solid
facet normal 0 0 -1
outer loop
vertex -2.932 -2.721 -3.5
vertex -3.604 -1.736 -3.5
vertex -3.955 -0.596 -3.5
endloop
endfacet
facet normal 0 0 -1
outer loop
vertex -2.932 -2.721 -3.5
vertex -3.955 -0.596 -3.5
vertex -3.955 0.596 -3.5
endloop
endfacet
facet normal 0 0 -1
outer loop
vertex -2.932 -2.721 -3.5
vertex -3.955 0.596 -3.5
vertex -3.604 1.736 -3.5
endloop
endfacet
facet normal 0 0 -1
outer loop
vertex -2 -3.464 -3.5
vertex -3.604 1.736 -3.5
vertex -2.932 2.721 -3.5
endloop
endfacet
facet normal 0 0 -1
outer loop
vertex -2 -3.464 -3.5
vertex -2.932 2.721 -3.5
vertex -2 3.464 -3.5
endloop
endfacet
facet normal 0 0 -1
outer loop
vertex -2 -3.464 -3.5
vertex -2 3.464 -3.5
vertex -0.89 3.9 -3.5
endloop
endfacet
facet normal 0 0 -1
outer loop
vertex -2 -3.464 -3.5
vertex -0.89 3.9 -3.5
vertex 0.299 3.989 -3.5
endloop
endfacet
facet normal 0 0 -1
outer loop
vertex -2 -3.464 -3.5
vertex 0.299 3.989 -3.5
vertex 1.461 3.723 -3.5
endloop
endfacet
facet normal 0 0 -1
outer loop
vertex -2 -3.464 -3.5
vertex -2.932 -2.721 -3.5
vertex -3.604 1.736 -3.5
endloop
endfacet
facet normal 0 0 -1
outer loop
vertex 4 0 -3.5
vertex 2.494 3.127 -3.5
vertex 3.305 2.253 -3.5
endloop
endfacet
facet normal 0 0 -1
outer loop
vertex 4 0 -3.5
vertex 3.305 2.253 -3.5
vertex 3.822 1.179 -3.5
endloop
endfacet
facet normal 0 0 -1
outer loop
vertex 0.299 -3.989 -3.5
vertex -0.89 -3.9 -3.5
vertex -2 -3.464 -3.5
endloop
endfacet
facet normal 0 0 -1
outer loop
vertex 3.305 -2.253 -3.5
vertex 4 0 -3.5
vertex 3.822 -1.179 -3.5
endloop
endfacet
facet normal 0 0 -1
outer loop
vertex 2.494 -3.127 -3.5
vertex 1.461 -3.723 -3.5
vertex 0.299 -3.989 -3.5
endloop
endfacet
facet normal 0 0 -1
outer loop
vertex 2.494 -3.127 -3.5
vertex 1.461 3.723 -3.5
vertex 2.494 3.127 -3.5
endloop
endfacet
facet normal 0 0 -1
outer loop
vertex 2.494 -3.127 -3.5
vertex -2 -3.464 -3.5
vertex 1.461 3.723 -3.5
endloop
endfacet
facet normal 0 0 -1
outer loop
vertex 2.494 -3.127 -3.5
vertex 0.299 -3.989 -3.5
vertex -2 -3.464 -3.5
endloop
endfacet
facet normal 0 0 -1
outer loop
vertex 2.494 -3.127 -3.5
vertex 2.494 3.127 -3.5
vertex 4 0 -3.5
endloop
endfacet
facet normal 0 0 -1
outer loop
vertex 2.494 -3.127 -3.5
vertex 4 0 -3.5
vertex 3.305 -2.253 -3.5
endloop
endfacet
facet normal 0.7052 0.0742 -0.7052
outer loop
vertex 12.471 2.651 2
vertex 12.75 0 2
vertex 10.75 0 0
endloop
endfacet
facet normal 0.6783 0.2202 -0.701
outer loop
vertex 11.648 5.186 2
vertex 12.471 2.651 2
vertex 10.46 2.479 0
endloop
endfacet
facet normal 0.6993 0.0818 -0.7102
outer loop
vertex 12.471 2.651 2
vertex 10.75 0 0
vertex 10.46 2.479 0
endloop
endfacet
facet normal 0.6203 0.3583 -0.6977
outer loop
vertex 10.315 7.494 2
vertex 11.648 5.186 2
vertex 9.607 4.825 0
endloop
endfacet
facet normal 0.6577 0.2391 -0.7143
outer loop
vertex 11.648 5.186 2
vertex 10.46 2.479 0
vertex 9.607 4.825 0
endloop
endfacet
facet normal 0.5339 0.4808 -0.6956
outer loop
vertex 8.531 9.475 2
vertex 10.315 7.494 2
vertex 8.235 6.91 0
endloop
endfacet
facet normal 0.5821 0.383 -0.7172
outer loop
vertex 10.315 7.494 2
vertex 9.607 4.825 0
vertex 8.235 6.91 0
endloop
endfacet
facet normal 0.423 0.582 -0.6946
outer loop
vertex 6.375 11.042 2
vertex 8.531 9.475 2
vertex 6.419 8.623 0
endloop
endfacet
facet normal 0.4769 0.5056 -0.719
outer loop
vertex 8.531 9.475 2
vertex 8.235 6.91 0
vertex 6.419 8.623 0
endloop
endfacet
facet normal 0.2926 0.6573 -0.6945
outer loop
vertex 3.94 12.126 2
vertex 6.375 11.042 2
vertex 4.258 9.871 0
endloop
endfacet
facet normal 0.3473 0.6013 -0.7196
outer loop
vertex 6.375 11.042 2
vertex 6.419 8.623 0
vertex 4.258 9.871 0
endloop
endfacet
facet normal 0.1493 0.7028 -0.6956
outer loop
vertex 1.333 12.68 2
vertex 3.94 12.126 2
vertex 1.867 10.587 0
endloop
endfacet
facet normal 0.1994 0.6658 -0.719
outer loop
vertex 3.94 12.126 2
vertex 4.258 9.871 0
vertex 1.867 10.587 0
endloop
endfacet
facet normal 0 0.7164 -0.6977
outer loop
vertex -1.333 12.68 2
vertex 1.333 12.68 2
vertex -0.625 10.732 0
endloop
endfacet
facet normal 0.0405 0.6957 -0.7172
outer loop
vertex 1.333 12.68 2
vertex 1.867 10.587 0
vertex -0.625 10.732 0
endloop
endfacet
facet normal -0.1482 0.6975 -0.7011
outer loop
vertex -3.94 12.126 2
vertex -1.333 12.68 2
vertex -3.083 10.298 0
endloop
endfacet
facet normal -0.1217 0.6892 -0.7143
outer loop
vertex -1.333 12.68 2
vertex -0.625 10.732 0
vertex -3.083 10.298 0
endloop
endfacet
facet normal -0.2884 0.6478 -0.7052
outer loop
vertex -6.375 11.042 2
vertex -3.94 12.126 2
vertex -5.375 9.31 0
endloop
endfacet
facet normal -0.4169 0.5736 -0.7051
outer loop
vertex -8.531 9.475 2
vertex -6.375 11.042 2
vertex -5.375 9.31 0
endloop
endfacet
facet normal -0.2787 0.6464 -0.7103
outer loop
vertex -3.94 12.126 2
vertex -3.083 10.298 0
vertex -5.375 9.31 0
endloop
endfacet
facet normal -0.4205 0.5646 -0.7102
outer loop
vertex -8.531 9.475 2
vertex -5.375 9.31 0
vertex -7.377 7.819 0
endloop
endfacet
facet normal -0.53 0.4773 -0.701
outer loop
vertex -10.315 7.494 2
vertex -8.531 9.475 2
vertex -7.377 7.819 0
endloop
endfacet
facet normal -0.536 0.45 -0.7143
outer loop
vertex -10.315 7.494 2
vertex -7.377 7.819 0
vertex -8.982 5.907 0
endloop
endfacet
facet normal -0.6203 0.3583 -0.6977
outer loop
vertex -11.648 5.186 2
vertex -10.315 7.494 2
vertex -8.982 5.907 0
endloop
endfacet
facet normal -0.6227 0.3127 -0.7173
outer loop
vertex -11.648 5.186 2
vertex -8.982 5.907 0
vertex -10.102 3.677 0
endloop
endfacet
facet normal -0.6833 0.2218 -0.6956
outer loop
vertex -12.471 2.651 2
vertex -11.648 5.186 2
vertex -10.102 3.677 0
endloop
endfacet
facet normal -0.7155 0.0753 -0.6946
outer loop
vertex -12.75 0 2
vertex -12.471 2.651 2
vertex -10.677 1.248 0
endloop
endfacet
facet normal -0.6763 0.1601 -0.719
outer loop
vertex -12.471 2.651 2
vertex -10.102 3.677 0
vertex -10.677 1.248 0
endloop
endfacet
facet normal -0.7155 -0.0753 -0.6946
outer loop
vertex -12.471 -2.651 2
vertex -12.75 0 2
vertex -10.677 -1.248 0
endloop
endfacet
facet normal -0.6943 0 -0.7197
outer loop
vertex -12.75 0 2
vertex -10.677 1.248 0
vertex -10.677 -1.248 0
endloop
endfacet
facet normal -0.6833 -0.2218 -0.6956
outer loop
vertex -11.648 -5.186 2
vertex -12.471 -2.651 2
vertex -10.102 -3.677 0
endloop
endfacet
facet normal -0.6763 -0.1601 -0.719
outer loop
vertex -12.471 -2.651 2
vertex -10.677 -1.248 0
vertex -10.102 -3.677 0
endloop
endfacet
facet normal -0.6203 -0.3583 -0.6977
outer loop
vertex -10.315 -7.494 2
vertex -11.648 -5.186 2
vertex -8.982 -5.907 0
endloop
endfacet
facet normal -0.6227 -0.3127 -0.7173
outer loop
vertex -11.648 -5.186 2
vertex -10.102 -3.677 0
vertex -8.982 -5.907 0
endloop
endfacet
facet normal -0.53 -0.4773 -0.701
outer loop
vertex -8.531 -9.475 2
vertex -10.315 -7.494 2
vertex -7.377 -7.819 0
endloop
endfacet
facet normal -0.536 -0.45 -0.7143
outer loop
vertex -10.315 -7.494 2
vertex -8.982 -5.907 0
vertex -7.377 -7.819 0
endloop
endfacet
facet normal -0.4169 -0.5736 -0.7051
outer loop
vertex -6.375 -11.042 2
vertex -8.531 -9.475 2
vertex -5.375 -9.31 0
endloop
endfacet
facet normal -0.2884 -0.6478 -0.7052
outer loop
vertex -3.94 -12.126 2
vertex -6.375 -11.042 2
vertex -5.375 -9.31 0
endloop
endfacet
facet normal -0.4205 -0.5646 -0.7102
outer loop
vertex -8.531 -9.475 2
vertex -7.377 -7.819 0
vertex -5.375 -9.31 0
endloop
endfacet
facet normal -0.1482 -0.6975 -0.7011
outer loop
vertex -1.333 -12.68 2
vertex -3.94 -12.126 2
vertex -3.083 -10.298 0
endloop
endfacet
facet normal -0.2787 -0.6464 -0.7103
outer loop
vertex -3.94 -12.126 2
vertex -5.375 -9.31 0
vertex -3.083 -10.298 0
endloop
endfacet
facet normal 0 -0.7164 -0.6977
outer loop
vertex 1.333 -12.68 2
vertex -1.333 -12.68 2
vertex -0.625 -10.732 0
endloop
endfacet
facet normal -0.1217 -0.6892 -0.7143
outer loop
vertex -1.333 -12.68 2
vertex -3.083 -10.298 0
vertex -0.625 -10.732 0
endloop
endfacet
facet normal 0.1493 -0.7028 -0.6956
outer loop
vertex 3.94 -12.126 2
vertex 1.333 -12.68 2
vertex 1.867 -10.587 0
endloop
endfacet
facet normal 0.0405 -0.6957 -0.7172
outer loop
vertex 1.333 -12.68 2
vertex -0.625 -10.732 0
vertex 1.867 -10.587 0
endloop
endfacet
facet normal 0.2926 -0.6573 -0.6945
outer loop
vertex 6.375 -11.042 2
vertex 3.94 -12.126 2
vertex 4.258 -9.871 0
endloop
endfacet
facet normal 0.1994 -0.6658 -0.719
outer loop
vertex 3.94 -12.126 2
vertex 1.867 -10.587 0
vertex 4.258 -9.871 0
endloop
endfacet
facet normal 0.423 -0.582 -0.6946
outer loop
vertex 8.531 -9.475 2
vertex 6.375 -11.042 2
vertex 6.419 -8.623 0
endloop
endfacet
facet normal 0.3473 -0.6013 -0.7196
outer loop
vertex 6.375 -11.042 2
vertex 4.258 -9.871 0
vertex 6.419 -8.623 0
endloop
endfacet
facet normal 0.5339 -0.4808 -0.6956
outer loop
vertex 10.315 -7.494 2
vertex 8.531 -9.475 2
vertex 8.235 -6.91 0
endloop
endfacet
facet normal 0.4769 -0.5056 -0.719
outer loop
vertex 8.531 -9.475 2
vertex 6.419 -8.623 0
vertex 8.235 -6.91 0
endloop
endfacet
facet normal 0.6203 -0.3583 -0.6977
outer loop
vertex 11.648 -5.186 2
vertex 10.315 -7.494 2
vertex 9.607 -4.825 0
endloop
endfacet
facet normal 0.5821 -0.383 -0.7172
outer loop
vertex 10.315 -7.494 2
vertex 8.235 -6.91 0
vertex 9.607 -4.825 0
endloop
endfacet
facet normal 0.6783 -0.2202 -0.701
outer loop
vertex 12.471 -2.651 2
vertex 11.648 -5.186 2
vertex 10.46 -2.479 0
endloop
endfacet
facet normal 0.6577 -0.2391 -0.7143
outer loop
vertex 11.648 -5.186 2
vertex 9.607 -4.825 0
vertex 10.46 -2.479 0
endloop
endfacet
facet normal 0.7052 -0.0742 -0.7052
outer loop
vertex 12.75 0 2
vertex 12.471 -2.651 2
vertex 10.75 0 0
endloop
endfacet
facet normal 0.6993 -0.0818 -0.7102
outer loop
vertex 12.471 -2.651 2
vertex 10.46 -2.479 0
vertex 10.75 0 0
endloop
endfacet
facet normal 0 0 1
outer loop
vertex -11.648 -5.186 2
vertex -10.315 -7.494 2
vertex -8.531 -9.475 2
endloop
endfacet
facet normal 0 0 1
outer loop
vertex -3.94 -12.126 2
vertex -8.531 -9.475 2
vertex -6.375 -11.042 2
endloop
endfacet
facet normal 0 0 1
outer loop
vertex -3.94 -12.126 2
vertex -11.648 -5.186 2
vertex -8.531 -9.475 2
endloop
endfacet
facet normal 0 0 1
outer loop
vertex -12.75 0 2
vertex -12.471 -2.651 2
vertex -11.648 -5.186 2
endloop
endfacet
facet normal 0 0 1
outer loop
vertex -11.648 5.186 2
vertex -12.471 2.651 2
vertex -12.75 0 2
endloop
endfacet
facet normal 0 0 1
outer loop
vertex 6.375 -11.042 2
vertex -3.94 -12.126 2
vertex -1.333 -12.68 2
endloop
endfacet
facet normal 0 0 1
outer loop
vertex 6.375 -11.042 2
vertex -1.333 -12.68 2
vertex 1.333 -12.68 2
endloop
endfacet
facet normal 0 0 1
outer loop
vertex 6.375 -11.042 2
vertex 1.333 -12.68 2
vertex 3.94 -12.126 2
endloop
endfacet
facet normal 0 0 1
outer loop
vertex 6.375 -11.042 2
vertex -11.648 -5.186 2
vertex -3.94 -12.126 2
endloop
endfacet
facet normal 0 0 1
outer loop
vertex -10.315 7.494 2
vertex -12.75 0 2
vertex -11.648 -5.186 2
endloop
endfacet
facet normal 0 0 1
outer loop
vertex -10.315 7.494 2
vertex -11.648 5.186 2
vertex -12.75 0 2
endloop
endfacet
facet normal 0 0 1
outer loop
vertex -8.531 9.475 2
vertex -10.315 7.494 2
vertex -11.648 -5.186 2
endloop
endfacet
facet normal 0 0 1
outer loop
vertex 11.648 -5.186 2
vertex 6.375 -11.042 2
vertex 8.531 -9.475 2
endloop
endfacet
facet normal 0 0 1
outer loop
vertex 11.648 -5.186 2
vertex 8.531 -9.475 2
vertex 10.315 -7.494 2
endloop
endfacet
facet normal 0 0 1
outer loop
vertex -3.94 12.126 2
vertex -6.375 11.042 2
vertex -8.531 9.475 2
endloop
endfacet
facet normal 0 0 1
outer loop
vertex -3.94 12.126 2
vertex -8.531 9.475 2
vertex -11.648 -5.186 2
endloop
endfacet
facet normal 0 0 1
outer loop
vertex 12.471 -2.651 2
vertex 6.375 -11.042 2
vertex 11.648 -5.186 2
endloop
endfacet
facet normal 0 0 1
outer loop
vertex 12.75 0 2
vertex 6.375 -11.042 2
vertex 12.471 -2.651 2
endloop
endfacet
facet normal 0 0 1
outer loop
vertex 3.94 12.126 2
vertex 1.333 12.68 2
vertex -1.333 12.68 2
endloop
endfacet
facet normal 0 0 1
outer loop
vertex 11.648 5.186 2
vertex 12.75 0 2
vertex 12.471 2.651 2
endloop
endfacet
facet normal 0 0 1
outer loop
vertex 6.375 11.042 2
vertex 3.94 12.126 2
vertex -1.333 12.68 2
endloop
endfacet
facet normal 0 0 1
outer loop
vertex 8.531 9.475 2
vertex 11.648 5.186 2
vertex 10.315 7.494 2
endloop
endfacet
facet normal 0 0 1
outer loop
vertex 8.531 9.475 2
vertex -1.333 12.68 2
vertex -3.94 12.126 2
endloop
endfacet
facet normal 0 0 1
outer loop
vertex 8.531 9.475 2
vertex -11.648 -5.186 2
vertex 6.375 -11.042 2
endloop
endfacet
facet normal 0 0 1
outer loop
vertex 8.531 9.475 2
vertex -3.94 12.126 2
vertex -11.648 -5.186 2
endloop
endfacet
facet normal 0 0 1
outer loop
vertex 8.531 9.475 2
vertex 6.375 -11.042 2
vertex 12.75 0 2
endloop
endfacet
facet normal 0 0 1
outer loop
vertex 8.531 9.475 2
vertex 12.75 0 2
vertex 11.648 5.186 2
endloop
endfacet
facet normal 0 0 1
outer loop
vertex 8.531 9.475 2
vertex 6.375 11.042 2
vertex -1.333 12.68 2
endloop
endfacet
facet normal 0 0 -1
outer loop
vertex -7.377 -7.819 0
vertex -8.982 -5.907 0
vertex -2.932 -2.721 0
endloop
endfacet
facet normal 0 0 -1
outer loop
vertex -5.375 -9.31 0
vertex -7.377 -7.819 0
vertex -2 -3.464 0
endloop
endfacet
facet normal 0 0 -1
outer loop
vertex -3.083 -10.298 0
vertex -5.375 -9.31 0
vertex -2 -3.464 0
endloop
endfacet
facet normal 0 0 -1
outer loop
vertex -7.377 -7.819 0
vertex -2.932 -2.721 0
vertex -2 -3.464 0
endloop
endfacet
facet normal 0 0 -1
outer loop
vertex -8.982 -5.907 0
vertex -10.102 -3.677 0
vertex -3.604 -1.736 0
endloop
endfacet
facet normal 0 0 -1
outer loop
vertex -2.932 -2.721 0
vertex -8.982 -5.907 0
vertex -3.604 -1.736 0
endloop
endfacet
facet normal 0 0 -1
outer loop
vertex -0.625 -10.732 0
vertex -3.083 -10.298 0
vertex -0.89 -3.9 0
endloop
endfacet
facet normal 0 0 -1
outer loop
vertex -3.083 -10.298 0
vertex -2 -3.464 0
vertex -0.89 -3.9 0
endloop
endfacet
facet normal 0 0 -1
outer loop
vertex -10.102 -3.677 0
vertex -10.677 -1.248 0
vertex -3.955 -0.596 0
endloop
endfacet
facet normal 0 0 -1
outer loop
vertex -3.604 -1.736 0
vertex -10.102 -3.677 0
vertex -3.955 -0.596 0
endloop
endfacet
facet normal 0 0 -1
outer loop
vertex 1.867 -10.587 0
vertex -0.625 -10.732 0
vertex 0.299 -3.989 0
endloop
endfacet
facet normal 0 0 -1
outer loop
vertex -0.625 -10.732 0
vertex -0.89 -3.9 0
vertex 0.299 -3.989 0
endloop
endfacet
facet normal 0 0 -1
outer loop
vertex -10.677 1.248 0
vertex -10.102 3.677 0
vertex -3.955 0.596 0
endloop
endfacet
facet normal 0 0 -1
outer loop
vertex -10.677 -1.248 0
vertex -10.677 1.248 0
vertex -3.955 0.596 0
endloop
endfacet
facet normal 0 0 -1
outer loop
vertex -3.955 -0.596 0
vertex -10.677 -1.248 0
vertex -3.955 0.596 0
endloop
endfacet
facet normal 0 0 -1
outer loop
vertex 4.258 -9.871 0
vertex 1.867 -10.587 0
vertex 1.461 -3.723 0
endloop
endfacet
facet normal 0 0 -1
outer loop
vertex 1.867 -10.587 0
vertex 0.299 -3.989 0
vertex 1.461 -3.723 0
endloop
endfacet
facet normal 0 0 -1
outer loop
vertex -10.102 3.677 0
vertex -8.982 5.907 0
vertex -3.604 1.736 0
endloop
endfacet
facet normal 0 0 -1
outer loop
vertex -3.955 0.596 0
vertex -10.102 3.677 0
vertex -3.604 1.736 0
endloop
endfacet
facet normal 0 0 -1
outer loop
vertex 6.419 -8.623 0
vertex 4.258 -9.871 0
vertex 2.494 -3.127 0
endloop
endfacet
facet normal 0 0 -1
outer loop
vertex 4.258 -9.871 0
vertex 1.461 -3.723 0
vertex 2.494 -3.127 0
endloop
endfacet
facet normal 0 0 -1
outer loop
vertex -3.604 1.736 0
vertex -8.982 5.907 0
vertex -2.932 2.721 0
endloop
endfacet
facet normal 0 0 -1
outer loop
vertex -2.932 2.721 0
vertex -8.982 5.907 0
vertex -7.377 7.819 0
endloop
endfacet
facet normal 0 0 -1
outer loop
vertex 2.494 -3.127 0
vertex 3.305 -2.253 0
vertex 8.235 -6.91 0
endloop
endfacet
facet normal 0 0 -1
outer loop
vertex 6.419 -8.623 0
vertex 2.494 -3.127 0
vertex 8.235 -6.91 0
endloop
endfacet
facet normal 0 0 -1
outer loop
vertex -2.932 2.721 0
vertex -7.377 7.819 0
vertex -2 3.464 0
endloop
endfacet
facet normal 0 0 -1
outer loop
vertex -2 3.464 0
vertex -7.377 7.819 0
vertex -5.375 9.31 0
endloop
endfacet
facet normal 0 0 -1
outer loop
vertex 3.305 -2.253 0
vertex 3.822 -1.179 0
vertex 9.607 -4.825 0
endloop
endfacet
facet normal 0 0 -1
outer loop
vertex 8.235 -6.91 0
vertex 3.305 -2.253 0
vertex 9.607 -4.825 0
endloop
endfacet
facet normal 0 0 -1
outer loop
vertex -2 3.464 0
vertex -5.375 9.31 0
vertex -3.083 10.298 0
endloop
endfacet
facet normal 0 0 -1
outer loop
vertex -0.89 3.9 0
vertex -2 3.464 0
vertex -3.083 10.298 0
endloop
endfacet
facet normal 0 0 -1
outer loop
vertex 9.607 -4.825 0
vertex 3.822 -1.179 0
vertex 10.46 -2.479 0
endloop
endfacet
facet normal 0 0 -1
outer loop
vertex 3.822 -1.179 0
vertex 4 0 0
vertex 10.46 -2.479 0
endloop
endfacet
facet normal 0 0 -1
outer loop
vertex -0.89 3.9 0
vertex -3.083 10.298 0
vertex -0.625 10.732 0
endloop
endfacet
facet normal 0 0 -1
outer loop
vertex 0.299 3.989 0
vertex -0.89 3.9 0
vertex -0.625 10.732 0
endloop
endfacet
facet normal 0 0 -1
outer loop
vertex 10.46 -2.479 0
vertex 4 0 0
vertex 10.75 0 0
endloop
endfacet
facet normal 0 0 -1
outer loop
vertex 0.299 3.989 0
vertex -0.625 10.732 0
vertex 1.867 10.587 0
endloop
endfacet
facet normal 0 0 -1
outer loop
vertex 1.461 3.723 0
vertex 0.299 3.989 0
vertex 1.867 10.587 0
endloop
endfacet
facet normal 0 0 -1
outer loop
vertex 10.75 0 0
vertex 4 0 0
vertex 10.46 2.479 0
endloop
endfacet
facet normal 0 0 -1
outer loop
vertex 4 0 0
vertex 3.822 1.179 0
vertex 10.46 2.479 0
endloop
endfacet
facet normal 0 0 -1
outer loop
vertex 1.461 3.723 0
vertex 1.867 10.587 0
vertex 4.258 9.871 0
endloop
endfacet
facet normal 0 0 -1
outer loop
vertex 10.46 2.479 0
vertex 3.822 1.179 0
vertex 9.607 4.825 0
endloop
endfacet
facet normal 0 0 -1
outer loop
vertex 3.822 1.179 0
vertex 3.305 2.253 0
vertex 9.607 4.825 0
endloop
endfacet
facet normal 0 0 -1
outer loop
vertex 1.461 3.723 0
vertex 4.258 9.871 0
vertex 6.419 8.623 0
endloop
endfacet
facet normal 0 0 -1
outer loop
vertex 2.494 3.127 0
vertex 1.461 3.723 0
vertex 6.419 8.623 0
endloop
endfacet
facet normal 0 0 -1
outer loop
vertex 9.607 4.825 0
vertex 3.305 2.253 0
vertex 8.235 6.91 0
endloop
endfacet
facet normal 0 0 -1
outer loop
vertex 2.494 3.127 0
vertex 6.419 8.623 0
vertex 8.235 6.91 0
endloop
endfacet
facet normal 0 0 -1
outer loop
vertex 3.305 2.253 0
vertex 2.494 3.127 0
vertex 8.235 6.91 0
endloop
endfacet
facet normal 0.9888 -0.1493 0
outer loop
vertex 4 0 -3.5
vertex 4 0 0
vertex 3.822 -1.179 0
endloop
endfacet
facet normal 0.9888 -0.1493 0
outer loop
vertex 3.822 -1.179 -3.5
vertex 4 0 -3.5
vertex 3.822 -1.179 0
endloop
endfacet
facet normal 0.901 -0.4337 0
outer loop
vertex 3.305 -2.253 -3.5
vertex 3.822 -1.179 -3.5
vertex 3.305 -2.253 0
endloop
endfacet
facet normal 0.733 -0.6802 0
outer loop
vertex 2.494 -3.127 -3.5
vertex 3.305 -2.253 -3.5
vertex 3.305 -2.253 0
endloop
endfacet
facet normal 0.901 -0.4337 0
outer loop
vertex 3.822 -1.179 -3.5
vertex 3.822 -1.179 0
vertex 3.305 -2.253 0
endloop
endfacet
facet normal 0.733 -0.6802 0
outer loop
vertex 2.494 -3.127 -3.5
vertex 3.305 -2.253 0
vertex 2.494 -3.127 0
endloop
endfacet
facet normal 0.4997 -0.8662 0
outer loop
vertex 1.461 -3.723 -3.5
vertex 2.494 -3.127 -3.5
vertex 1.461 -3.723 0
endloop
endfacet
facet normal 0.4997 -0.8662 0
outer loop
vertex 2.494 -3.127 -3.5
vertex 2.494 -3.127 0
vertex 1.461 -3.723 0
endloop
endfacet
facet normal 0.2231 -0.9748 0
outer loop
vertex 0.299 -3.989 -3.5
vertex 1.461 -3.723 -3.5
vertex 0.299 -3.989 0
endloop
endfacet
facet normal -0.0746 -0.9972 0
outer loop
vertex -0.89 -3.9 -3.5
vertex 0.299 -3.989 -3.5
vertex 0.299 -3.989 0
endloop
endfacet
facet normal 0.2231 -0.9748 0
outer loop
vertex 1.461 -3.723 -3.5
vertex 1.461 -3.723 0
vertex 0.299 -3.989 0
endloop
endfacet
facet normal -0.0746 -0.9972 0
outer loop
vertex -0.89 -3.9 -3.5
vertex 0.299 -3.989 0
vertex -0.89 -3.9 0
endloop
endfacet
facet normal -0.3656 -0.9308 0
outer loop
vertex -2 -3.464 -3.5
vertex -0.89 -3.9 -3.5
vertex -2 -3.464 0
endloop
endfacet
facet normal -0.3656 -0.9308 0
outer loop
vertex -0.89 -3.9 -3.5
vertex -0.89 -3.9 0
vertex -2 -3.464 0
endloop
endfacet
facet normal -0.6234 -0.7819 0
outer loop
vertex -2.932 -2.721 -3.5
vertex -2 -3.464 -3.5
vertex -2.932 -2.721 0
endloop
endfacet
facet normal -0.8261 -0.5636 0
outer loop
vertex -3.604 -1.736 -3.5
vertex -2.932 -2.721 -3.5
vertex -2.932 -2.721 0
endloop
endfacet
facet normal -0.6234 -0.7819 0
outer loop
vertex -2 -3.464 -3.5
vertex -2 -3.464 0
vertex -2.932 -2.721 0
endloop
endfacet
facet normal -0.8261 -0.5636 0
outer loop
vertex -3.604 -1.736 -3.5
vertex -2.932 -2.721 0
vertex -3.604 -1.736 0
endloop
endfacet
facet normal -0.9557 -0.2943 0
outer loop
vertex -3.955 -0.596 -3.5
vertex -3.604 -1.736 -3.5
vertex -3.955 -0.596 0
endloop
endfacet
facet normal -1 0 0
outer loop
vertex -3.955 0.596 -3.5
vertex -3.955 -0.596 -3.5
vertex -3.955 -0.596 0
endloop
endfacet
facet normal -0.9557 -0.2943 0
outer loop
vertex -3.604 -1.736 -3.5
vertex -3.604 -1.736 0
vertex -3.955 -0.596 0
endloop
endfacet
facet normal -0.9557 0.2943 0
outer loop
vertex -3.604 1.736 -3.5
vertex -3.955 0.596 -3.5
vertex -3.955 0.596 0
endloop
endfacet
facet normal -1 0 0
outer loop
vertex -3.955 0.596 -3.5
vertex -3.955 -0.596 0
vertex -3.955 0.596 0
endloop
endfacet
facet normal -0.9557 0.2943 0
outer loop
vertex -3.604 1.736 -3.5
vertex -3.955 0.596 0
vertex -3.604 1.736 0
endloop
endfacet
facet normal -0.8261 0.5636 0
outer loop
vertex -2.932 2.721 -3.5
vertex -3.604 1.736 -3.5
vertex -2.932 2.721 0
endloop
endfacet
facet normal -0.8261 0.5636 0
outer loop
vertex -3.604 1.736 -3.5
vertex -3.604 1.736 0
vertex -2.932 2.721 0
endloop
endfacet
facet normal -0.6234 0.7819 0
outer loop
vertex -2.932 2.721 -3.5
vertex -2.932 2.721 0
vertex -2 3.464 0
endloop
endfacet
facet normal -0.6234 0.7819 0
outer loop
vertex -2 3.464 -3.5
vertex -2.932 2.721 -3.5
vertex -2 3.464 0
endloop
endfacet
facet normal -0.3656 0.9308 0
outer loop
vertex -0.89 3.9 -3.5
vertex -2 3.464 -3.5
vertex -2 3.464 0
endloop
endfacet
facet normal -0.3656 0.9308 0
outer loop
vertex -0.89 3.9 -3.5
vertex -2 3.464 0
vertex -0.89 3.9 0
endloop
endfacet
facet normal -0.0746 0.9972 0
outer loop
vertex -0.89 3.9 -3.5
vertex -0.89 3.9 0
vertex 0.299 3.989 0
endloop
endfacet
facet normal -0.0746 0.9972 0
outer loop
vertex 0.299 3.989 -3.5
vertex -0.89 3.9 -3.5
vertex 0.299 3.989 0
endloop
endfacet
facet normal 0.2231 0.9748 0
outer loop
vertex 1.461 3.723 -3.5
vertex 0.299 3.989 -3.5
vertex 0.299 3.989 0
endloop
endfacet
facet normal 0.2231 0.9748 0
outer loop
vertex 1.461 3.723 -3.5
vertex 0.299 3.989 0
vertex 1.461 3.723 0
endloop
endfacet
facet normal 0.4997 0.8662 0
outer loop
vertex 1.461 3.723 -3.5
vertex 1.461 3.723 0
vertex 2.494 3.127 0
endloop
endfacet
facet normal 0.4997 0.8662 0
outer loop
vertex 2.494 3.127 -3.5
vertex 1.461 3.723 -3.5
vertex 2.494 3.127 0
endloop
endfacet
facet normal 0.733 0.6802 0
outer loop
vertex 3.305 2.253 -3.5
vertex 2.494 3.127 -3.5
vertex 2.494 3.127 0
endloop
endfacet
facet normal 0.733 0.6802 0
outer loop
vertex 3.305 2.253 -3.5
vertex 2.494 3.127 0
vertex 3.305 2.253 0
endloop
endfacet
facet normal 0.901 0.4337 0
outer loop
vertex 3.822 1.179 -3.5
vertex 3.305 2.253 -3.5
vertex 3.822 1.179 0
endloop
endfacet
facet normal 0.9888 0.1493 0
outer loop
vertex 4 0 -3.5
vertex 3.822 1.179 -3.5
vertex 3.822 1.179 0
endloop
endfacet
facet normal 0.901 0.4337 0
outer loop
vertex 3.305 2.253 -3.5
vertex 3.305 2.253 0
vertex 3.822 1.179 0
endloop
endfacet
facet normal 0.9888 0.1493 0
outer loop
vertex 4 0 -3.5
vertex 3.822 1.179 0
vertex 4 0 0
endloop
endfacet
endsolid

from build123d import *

# Parameters (mm, degrees)
F0_R     = 12.75
F1_DEPTH = 2
F2_SIZE  = 1.99999
F3_R     = 4
F4_DEPTH = 3.5


# Not quite as in the source:
# - a fillet or chamfer is up to 0.001 mm smaller than in the source, because OpenCascade refuses the exact size


with BuildPart() as f1:
    # F0 (on Top) → F1 (new body)
    with BuildSketch(Plane.XY):
        Circle(F0_R)
    extrude(amount=F1_DEPTH)

    # F2 (size 2 in the source; OpenCascade refuses exactly that, so slightly less here)
    f2_edges = [f1.edges().sort_by_distance(p)[0] for p in [
        (-12.75, 0, 0),
    ]]
    chamfer(f2_edges, length=F2_SIZE)

    # F3 (on face) → F4 (join)
    with BuildSketch(Plane(origin=(0, 0, 0), x_dir=(1, 0, 0), z_dir=(0, 0, -1))):
        Circle(F3_R)
    extrude(amount=F4_DEPTH)


solid = f1.part
